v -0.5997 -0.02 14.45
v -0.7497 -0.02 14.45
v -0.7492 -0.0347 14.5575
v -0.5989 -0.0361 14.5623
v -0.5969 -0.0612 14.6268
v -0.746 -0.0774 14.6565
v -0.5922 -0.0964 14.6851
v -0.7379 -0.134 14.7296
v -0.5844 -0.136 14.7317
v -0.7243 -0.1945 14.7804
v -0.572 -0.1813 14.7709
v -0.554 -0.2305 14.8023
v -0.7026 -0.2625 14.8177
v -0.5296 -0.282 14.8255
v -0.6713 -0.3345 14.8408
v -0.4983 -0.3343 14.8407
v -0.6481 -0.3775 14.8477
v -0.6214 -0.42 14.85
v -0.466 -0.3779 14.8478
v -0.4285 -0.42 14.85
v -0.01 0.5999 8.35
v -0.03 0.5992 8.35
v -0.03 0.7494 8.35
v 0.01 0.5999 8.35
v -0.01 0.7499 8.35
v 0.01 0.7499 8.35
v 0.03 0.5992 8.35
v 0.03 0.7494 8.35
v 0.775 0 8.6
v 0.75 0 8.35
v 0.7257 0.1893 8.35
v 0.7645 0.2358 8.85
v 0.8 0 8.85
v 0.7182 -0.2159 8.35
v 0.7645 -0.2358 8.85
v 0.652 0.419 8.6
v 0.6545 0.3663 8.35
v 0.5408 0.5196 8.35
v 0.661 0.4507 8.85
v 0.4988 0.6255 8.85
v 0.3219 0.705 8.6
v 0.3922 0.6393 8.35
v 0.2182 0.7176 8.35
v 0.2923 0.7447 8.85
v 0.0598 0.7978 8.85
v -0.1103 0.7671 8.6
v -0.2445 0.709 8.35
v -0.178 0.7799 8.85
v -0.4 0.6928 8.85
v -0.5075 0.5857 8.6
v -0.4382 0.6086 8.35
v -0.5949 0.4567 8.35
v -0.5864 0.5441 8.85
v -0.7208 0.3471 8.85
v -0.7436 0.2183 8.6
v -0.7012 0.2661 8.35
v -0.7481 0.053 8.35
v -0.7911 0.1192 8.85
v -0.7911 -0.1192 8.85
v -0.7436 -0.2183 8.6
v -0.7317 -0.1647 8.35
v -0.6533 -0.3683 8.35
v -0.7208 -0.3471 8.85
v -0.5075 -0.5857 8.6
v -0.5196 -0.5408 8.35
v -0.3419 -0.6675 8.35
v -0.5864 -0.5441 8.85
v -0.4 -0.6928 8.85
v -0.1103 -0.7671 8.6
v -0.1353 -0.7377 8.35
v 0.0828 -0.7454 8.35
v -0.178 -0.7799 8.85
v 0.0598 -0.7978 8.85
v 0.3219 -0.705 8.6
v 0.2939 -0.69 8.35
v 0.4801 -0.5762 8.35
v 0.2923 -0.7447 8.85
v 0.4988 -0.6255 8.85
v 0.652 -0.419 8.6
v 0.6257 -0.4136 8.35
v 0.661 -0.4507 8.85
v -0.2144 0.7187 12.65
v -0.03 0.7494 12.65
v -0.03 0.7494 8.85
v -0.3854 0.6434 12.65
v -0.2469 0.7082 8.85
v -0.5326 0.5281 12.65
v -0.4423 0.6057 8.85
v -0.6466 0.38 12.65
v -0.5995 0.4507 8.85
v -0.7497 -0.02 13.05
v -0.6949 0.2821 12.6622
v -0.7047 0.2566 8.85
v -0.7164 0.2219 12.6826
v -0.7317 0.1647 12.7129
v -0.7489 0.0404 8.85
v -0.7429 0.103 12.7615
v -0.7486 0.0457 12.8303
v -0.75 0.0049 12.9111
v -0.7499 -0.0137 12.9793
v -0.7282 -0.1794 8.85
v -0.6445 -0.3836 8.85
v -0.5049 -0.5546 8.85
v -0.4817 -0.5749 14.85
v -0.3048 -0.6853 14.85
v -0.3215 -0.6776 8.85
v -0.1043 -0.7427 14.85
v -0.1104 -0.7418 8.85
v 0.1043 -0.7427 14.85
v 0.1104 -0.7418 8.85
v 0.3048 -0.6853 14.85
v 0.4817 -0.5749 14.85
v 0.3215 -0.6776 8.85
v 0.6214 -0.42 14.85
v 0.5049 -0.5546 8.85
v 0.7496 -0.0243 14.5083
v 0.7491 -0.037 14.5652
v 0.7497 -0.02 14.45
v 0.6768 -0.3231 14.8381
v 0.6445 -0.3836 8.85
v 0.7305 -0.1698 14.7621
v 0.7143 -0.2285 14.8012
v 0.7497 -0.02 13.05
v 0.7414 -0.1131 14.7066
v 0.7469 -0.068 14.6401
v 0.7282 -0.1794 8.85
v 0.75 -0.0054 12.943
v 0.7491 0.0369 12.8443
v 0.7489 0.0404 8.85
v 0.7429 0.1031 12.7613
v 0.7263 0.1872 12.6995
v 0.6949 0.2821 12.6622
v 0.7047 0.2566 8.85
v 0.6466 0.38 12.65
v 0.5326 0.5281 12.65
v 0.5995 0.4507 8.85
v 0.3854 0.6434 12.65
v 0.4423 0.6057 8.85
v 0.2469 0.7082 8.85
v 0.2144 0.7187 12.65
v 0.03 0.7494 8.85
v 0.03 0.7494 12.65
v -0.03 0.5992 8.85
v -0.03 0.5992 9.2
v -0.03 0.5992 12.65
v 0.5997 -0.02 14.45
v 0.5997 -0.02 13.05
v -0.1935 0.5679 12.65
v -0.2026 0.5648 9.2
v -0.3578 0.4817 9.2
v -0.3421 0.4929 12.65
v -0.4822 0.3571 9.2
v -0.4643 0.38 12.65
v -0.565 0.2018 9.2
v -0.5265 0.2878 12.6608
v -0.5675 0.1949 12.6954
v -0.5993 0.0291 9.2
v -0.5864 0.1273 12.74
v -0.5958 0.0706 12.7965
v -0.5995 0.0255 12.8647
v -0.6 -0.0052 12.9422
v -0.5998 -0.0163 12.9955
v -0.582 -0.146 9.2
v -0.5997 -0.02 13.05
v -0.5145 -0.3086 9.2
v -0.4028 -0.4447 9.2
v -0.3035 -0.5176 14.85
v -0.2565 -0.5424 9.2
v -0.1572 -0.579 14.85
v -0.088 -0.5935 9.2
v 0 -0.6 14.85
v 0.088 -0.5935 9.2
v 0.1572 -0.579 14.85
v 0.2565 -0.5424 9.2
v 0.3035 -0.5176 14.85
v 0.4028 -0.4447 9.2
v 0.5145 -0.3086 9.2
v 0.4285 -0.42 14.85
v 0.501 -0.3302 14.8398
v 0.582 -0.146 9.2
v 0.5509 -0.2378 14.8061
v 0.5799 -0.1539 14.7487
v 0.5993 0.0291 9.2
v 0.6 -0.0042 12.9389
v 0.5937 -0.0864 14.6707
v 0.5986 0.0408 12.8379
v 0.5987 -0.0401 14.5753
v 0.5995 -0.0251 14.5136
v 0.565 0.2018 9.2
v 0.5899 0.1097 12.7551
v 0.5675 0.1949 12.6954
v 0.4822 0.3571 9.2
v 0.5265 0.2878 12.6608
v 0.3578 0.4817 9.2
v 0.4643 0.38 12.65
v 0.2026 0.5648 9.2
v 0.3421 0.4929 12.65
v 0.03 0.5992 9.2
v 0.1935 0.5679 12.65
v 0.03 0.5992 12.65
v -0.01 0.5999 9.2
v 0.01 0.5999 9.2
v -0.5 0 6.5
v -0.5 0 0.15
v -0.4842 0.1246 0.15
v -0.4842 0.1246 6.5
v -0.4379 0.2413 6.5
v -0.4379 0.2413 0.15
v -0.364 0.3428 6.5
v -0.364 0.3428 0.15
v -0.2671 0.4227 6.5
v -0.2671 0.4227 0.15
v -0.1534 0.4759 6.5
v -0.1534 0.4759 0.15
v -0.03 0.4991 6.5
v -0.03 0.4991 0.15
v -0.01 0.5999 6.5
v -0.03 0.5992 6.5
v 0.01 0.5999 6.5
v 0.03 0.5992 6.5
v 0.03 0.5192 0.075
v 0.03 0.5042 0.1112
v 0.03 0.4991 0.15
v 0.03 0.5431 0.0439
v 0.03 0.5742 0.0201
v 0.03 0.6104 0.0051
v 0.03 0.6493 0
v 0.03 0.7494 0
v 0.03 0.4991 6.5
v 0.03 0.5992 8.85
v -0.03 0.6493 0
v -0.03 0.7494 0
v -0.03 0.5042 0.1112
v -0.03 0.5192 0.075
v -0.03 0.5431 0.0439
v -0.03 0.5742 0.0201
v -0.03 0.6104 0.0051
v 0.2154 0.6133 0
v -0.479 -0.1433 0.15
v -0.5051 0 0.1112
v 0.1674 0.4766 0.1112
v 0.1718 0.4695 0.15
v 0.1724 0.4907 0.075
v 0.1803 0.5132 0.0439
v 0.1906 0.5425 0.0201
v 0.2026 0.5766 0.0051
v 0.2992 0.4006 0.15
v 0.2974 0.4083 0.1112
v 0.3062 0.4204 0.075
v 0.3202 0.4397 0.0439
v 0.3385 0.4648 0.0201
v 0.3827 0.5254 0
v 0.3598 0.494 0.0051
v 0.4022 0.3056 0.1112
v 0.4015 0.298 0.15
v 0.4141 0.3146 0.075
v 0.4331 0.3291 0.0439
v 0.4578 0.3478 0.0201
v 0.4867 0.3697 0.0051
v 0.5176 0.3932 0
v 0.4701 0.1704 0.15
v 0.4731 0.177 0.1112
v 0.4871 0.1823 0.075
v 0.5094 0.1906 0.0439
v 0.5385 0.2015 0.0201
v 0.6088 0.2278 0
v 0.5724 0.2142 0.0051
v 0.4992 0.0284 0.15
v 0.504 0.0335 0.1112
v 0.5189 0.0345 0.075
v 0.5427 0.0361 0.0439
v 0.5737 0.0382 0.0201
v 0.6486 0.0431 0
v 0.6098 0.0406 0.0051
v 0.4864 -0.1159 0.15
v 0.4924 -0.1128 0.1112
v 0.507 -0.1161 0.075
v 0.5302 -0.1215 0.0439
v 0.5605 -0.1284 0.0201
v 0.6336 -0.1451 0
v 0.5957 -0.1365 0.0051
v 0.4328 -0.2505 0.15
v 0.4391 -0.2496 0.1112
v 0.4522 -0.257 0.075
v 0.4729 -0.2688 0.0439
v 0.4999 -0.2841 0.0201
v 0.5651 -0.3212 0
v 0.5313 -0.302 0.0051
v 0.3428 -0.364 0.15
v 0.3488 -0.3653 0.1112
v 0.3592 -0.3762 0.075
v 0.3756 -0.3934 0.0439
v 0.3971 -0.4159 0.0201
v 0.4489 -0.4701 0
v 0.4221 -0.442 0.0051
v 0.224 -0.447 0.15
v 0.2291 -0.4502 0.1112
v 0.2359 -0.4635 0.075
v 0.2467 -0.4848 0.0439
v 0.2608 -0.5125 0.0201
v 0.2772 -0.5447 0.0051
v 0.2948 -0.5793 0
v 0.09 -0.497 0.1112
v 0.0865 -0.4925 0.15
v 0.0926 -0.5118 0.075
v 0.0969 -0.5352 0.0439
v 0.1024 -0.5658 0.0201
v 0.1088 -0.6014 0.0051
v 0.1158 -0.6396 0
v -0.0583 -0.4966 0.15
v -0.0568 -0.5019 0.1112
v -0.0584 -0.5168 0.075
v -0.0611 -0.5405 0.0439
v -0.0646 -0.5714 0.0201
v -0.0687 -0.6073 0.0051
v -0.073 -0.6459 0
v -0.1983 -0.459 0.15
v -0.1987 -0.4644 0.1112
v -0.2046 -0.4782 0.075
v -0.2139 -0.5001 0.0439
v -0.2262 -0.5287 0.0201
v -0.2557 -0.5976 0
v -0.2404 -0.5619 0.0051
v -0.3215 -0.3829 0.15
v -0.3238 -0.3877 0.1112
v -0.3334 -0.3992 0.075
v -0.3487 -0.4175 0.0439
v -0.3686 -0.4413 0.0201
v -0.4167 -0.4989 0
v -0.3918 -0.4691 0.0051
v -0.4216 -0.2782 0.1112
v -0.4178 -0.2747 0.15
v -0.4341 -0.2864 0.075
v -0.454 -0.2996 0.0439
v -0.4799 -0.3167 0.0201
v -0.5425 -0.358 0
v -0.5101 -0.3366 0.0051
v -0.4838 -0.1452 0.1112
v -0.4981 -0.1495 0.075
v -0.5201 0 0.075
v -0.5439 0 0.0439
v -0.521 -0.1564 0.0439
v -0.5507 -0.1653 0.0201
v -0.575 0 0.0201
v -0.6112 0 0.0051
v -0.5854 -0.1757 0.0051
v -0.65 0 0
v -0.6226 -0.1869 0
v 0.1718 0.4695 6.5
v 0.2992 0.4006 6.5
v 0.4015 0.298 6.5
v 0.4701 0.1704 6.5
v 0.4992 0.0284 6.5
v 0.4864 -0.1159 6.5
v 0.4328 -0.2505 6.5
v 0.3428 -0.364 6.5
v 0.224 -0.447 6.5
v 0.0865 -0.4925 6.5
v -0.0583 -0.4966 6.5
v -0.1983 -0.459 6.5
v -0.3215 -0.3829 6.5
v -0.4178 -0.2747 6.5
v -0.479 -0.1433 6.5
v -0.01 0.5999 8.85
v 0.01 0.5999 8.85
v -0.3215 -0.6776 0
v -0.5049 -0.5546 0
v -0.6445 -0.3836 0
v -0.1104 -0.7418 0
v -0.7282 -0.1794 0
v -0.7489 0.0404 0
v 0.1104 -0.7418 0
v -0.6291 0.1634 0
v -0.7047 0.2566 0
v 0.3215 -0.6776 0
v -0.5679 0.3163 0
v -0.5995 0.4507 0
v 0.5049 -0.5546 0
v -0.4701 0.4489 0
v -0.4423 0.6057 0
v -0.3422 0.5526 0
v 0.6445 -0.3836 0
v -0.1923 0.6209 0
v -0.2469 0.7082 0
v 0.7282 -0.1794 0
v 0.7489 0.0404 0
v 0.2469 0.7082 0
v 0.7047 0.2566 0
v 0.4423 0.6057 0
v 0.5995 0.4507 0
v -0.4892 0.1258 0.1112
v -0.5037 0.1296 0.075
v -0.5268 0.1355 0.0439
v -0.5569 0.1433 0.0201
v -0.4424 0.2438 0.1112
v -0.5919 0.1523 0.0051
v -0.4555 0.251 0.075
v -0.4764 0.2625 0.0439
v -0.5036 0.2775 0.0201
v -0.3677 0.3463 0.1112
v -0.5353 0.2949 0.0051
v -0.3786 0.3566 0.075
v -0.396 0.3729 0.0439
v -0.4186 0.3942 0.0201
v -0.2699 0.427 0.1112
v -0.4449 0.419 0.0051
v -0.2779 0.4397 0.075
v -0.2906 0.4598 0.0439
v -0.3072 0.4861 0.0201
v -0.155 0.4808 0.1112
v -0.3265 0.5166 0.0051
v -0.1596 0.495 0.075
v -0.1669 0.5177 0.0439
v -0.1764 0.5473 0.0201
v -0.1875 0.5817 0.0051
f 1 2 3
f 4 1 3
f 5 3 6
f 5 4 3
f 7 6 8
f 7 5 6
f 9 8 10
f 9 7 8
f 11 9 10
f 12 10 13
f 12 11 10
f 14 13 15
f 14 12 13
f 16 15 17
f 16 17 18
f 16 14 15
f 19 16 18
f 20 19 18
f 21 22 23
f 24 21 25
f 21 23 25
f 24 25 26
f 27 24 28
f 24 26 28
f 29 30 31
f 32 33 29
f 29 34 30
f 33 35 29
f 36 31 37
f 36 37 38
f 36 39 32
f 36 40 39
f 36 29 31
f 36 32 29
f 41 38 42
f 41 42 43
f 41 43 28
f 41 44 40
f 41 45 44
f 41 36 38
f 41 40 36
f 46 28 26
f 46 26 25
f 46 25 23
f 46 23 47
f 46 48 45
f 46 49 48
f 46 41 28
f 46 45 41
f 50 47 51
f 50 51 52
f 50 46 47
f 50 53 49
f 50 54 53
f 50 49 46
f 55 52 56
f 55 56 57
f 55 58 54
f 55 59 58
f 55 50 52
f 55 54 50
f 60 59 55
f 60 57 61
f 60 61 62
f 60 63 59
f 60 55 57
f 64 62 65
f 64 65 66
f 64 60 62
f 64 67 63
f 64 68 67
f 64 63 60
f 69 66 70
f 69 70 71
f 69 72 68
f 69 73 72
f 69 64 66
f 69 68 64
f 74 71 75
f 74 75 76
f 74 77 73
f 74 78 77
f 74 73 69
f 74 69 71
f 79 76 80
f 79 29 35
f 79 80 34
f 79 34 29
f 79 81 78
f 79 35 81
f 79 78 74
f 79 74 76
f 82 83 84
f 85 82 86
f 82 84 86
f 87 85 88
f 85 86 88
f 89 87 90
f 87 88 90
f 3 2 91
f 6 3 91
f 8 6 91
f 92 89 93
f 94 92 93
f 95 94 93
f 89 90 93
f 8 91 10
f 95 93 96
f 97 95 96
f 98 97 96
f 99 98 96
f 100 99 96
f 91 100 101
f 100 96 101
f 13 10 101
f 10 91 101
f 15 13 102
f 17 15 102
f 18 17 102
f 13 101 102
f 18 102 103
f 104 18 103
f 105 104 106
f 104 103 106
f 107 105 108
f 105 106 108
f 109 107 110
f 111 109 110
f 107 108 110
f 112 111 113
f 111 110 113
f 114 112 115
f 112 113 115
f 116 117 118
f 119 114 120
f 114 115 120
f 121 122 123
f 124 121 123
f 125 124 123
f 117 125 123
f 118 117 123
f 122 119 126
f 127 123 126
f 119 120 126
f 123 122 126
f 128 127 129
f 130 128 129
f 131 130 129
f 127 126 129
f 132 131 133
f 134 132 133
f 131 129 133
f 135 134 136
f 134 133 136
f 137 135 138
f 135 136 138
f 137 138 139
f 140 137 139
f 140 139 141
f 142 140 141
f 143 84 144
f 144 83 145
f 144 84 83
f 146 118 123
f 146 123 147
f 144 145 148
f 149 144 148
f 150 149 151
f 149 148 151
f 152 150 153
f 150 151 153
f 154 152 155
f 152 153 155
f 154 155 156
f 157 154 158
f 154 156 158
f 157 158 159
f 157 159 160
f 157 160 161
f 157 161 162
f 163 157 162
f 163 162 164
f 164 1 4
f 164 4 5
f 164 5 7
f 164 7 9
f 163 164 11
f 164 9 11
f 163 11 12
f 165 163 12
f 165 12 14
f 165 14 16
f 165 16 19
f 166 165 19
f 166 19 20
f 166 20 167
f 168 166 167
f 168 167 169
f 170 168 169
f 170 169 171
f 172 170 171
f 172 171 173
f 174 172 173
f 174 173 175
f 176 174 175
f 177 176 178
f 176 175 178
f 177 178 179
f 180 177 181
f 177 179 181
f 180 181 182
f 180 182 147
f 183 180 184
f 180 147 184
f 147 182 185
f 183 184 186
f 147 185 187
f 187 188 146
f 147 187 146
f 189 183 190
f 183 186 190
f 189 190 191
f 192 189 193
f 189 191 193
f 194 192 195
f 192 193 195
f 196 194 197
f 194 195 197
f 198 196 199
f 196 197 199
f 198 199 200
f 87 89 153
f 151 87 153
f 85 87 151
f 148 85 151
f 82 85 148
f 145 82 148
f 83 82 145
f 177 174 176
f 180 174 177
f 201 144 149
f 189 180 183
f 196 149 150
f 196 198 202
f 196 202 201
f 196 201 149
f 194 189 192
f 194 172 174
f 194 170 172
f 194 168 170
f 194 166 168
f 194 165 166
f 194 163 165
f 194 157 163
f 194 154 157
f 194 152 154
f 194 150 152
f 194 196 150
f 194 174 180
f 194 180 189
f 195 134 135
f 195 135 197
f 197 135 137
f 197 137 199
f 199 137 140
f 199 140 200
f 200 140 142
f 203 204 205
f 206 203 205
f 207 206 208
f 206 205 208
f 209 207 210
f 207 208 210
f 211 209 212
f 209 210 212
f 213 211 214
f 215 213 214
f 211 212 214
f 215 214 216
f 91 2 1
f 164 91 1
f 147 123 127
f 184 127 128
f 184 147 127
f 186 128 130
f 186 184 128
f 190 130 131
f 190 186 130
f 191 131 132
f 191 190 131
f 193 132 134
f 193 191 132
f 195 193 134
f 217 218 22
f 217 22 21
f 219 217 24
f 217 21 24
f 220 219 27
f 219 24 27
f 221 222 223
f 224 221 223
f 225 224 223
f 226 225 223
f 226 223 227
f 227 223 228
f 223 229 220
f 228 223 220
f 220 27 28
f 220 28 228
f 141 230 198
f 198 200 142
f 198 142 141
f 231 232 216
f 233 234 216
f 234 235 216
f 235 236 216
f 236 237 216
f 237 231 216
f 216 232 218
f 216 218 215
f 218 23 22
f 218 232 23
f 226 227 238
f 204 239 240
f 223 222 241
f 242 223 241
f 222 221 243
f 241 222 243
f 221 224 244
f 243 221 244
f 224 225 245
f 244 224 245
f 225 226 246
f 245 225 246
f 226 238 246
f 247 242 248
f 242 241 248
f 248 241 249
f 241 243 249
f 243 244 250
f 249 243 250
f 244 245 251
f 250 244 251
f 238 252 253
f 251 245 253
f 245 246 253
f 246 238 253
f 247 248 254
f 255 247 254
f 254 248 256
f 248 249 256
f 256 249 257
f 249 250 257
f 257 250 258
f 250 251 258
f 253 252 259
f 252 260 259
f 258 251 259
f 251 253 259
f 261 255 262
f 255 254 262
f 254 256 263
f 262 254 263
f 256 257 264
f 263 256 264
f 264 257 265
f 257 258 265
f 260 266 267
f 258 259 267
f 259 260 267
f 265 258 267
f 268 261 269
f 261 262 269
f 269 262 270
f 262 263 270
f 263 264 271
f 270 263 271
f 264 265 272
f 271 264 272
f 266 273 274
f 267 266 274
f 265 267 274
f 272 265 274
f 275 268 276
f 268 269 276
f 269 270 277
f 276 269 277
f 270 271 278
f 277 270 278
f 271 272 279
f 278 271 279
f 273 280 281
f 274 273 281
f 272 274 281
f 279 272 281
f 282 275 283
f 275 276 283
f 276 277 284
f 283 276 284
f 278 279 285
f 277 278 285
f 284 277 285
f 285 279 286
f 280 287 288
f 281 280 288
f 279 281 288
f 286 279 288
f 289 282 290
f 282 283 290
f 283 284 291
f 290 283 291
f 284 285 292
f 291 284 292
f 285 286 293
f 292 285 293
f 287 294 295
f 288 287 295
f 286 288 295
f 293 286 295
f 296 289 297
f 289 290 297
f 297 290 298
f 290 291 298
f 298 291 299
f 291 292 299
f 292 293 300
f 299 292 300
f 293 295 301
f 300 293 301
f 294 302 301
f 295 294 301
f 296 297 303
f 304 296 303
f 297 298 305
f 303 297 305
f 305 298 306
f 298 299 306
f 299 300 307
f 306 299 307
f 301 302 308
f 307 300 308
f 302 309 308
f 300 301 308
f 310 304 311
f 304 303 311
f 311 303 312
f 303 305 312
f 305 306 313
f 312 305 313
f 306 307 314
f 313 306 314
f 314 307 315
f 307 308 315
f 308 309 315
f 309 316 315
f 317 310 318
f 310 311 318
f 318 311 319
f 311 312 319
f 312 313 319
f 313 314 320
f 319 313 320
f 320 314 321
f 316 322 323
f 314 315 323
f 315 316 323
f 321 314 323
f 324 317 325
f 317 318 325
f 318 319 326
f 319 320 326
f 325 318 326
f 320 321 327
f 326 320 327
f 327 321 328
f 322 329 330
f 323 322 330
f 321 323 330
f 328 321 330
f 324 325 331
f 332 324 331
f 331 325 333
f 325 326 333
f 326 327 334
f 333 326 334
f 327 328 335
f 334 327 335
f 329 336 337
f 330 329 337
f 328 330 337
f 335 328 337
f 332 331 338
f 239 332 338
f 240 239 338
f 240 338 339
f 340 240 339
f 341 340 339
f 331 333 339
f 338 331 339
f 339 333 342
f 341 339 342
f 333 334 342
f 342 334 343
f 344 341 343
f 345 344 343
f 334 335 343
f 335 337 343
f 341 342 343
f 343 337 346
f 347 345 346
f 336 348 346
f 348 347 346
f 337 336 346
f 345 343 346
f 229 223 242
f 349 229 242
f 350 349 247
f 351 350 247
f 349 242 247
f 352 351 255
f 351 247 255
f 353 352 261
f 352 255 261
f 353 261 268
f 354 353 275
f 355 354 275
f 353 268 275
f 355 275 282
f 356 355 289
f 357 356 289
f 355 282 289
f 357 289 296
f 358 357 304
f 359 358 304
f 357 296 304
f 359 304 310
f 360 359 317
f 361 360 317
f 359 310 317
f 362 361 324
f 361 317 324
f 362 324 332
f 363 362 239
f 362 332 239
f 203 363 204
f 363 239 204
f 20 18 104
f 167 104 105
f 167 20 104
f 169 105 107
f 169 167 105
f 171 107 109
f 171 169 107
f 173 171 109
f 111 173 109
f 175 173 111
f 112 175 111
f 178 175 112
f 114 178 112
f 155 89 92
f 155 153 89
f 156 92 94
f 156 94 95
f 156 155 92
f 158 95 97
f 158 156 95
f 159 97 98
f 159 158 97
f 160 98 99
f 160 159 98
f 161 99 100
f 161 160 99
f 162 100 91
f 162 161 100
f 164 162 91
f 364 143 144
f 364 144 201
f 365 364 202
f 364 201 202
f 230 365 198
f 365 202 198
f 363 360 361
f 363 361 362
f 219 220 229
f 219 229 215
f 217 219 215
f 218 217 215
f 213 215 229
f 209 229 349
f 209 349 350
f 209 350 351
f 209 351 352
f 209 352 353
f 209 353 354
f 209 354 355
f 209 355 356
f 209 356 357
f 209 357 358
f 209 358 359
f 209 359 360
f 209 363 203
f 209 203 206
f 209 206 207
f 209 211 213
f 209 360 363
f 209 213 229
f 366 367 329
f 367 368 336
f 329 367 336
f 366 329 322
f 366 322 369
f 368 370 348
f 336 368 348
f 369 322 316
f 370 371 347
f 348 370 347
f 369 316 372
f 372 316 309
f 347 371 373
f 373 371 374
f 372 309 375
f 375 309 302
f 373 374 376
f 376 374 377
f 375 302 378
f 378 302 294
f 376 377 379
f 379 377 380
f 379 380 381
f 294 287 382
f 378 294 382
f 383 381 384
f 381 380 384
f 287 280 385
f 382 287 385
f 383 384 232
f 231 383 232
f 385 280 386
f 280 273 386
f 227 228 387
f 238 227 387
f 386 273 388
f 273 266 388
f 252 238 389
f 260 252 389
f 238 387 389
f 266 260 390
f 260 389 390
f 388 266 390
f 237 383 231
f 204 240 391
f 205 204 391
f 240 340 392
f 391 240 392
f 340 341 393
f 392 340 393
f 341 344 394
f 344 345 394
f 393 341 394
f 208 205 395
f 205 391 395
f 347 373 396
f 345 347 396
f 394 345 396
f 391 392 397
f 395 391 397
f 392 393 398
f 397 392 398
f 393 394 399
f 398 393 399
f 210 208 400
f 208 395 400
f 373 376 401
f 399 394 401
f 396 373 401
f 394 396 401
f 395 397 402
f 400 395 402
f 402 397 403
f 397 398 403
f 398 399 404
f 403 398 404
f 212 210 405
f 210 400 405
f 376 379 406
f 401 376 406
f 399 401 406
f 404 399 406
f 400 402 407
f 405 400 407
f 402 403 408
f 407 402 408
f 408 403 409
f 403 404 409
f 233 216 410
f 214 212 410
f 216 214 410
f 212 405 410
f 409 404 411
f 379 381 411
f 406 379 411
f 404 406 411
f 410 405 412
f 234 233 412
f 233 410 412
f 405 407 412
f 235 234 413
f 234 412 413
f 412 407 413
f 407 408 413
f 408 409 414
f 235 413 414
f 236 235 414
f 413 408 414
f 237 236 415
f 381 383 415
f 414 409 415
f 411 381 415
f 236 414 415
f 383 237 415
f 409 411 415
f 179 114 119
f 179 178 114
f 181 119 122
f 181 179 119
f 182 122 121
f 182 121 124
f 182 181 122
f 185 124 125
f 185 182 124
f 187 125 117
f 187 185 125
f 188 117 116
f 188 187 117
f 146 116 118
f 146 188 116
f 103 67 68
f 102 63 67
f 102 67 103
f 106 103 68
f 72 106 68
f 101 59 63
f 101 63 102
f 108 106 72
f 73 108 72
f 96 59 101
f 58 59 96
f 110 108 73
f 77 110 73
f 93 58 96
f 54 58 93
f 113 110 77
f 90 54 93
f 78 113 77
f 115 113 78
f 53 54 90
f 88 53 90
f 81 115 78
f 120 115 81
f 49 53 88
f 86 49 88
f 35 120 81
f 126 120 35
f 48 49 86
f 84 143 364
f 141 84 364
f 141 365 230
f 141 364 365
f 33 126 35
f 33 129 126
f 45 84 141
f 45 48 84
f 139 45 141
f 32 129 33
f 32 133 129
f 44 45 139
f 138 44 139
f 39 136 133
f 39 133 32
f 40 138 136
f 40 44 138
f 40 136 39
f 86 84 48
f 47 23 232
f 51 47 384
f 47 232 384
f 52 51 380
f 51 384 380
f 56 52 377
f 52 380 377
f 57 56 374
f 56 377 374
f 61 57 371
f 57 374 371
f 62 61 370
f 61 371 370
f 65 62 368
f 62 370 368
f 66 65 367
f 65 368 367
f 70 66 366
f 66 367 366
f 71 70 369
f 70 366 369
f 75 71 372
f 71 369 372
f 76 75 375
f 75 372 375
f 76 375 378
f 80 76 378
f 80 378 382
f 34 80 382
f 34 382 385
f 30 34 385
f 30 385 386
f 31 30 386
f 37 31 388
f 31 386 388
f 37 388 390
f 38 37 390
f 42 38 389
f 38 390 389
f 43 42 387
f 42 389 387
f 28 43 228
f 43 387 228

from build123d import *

# Parameters (mm, degrees)
SKETCH1_R           = 0.75
BOSS_EXTRUDE1_DEPTH = 5.1
SKETCH8_R           = 0.75
BOSS_EXTRUDE2_DEPTH = 1.75
SKETCH9_R           = 0.75
BOSS_EXTRUDE3_DEPTH = 8
SKETCH10_R          = 0.6
CUT_EXTRUDE7_DEPTH  = 5.65
SKETCH11_R          = 0.5
CUT_EXTRUDE8_DEPTH  = 6.5
CUT_EXTRUDE9_DEPTH  = 14.85
CUT_EXTRUDE10_DEPTH = 6.5
FILLET2_R           = 0.15
CUT_EXTRUDE11_DEPTH = 2.2
FILLET3_R           = 0.4
SKETCH17_R          = 0.75
SKETCH16_R          = 0.8


with BuildPart() as part:
    # Sketch1 → Boss-Extrude1 (new body)
    with BuildSketch(Plane.XY):
        Circle(SKETCH1_R)
    extrude(amount=BOSS_EXTRUDE1_DEPTH)

    # Sketch8 → Boss-Extrude2 (add)
    with BuildSketch(Plane.XY.offset(5.1)):
        Circle(SKETCH8_R)
    extrude(amount=BOSS_EXTRUDE2_DEPTH)

    # Sketch9 → Boss-Extrude3 (add)
    with BuildSketch(Plane.XY.offset(6.85)):
        Circle(SKETCH9_R)
    extrude(amount=BOSS_EXTRUDE3_DEPTH)

    # Sketch10 → Cut-Extrude7 (cut)
    with BuildSketch(Plane.XY.offset(14.85)):
        Circle(SKETCH10_R)
    extrude(amount=-CUT_EXTRUDE7_DEPTH, mode=Mode.SUBTRACT)

    # Sketch11 → Cut-Extrude8 (cut)
    with BuildSketch(Plane(origin=(0, 0, 0), x_dir=(-1, 0, 0), z_dir=(0, 0, -1))):
        Circle(SKETCH11_R)
    extrude(amount=-CUT_EXTRUDE8_DEPTH, mode=Mode.SUBTRACT)

    # Sketch12 → Cut-Extrude9 (cut)
    with BuildSketch(Plane.XY.offset(14.85)):
        with BuildLine():
            Line((-0.03, 0.74939976), (-0.03, 0.599249531))
            ThreePointArc((-0.03, 0.599249531), (0, 0.6), (0.03, 0.599249531))
            Line((0.03, 0.599249531), (0.03, 0.74939976))
            ThreePointArc((0.03, 0.74939976), (0, 0.75), (-0.03, 0.74939976))
        make_face()
    extrude(amount=-CUT_EXTRUDE9_DEPTH, mode=Mode.SUBTRACT)

    # Sketch14 → Cut-Extrude10 (cut)
    with BuildSketch(Plane(origin=(0, 0, 0), x_dir=(-1, 0, 0), z_dir=(0, 0, -1))):
        with BuildLine():
            Line((-0.03, 0.74939976), (-0.03, 0.499099189))
            ThreePointArc((-0.03, 0.499099189), (0, 0.5), (0.03, 0.499099189))
            Line((0.03, 0.499099189), (0.03, 0.74939976))
            ThreePointArc((0.03, 0.74939976), (0, 0.75), (-0.03, 0.74939976))
        make_face()
    extrude(amount=-CUT_EXTRUDE10_DEPTH, mode=Mode.SUBTRACT)

    # Fillet2
    fillet2_edges = [part.edges().sort_by_distance(p)[0] for p in [
        (0.34278273, -0.364005494, 0),
    ]]
    fillet(fillet2_edges, radius=FILLET2_R)

    # Sketch15 → Cut-Extrude11 (cut)
    with BuildSketch(Plane.XY.offset(14.85)):
        with BuildLine():
            Line((-0.749733286, -0.02), (-0.599666574, -0.02))
            ThreePointArc((-0.599666574, -0.02), (-0.441573883, 0.406217314), (-0.03, 0.599249531))
            Line((-0.03, 0.599249531), (-0.03, 0.74939976))
            ThreePointArc((-0.03, 0.74939976), (-0.547713426, 0.5123573), (-0.749733286, -0.02))
        make_face()
        with BuildLine():
            Line((0.03, 0.599249531), (0.03, 0.74939976))
            ThreePointArc((0.03, 0.74939976), (0.547713426, 0.5123573), (0.749733286, -0.02))
            Line((0.749733286, -0.02), (0.599666574, -0.02))
            ThreePointArc((0.599666574, -0.02), (0.441573883, 0.406217314), (0.03, 0.599249531))
        make_face()
    extrude(amount=-CUT_EXTRUDE11_DEPTH, mode=Mode.SUBTRACT)

    # Fillet3
    fillet3_edges = [part.edges().sort_by_distance(p)[0] for p in [
        (-0.67469993, -0.02, 12.65),
        (-0.67469993, -0.02, 14.85),
        (0.67469993, -0.02, 12.65),
        (0.67469993, -0.02, 14.85),
    ]]
    fillet(fillet3_edges, radius=FILLET3_R)

    # Sketch17 → Loft1 section 0
    with BuildSketch(Plane.XY.offset(8.35)):
        Circle(SKETCH17_R)
    # Sketch16 → Loft1 section 1
    with BuildSketch(Plane.XY.offset(8.85)):
        Circle(SKETCH16_R)
    loft()


solid = part.part
